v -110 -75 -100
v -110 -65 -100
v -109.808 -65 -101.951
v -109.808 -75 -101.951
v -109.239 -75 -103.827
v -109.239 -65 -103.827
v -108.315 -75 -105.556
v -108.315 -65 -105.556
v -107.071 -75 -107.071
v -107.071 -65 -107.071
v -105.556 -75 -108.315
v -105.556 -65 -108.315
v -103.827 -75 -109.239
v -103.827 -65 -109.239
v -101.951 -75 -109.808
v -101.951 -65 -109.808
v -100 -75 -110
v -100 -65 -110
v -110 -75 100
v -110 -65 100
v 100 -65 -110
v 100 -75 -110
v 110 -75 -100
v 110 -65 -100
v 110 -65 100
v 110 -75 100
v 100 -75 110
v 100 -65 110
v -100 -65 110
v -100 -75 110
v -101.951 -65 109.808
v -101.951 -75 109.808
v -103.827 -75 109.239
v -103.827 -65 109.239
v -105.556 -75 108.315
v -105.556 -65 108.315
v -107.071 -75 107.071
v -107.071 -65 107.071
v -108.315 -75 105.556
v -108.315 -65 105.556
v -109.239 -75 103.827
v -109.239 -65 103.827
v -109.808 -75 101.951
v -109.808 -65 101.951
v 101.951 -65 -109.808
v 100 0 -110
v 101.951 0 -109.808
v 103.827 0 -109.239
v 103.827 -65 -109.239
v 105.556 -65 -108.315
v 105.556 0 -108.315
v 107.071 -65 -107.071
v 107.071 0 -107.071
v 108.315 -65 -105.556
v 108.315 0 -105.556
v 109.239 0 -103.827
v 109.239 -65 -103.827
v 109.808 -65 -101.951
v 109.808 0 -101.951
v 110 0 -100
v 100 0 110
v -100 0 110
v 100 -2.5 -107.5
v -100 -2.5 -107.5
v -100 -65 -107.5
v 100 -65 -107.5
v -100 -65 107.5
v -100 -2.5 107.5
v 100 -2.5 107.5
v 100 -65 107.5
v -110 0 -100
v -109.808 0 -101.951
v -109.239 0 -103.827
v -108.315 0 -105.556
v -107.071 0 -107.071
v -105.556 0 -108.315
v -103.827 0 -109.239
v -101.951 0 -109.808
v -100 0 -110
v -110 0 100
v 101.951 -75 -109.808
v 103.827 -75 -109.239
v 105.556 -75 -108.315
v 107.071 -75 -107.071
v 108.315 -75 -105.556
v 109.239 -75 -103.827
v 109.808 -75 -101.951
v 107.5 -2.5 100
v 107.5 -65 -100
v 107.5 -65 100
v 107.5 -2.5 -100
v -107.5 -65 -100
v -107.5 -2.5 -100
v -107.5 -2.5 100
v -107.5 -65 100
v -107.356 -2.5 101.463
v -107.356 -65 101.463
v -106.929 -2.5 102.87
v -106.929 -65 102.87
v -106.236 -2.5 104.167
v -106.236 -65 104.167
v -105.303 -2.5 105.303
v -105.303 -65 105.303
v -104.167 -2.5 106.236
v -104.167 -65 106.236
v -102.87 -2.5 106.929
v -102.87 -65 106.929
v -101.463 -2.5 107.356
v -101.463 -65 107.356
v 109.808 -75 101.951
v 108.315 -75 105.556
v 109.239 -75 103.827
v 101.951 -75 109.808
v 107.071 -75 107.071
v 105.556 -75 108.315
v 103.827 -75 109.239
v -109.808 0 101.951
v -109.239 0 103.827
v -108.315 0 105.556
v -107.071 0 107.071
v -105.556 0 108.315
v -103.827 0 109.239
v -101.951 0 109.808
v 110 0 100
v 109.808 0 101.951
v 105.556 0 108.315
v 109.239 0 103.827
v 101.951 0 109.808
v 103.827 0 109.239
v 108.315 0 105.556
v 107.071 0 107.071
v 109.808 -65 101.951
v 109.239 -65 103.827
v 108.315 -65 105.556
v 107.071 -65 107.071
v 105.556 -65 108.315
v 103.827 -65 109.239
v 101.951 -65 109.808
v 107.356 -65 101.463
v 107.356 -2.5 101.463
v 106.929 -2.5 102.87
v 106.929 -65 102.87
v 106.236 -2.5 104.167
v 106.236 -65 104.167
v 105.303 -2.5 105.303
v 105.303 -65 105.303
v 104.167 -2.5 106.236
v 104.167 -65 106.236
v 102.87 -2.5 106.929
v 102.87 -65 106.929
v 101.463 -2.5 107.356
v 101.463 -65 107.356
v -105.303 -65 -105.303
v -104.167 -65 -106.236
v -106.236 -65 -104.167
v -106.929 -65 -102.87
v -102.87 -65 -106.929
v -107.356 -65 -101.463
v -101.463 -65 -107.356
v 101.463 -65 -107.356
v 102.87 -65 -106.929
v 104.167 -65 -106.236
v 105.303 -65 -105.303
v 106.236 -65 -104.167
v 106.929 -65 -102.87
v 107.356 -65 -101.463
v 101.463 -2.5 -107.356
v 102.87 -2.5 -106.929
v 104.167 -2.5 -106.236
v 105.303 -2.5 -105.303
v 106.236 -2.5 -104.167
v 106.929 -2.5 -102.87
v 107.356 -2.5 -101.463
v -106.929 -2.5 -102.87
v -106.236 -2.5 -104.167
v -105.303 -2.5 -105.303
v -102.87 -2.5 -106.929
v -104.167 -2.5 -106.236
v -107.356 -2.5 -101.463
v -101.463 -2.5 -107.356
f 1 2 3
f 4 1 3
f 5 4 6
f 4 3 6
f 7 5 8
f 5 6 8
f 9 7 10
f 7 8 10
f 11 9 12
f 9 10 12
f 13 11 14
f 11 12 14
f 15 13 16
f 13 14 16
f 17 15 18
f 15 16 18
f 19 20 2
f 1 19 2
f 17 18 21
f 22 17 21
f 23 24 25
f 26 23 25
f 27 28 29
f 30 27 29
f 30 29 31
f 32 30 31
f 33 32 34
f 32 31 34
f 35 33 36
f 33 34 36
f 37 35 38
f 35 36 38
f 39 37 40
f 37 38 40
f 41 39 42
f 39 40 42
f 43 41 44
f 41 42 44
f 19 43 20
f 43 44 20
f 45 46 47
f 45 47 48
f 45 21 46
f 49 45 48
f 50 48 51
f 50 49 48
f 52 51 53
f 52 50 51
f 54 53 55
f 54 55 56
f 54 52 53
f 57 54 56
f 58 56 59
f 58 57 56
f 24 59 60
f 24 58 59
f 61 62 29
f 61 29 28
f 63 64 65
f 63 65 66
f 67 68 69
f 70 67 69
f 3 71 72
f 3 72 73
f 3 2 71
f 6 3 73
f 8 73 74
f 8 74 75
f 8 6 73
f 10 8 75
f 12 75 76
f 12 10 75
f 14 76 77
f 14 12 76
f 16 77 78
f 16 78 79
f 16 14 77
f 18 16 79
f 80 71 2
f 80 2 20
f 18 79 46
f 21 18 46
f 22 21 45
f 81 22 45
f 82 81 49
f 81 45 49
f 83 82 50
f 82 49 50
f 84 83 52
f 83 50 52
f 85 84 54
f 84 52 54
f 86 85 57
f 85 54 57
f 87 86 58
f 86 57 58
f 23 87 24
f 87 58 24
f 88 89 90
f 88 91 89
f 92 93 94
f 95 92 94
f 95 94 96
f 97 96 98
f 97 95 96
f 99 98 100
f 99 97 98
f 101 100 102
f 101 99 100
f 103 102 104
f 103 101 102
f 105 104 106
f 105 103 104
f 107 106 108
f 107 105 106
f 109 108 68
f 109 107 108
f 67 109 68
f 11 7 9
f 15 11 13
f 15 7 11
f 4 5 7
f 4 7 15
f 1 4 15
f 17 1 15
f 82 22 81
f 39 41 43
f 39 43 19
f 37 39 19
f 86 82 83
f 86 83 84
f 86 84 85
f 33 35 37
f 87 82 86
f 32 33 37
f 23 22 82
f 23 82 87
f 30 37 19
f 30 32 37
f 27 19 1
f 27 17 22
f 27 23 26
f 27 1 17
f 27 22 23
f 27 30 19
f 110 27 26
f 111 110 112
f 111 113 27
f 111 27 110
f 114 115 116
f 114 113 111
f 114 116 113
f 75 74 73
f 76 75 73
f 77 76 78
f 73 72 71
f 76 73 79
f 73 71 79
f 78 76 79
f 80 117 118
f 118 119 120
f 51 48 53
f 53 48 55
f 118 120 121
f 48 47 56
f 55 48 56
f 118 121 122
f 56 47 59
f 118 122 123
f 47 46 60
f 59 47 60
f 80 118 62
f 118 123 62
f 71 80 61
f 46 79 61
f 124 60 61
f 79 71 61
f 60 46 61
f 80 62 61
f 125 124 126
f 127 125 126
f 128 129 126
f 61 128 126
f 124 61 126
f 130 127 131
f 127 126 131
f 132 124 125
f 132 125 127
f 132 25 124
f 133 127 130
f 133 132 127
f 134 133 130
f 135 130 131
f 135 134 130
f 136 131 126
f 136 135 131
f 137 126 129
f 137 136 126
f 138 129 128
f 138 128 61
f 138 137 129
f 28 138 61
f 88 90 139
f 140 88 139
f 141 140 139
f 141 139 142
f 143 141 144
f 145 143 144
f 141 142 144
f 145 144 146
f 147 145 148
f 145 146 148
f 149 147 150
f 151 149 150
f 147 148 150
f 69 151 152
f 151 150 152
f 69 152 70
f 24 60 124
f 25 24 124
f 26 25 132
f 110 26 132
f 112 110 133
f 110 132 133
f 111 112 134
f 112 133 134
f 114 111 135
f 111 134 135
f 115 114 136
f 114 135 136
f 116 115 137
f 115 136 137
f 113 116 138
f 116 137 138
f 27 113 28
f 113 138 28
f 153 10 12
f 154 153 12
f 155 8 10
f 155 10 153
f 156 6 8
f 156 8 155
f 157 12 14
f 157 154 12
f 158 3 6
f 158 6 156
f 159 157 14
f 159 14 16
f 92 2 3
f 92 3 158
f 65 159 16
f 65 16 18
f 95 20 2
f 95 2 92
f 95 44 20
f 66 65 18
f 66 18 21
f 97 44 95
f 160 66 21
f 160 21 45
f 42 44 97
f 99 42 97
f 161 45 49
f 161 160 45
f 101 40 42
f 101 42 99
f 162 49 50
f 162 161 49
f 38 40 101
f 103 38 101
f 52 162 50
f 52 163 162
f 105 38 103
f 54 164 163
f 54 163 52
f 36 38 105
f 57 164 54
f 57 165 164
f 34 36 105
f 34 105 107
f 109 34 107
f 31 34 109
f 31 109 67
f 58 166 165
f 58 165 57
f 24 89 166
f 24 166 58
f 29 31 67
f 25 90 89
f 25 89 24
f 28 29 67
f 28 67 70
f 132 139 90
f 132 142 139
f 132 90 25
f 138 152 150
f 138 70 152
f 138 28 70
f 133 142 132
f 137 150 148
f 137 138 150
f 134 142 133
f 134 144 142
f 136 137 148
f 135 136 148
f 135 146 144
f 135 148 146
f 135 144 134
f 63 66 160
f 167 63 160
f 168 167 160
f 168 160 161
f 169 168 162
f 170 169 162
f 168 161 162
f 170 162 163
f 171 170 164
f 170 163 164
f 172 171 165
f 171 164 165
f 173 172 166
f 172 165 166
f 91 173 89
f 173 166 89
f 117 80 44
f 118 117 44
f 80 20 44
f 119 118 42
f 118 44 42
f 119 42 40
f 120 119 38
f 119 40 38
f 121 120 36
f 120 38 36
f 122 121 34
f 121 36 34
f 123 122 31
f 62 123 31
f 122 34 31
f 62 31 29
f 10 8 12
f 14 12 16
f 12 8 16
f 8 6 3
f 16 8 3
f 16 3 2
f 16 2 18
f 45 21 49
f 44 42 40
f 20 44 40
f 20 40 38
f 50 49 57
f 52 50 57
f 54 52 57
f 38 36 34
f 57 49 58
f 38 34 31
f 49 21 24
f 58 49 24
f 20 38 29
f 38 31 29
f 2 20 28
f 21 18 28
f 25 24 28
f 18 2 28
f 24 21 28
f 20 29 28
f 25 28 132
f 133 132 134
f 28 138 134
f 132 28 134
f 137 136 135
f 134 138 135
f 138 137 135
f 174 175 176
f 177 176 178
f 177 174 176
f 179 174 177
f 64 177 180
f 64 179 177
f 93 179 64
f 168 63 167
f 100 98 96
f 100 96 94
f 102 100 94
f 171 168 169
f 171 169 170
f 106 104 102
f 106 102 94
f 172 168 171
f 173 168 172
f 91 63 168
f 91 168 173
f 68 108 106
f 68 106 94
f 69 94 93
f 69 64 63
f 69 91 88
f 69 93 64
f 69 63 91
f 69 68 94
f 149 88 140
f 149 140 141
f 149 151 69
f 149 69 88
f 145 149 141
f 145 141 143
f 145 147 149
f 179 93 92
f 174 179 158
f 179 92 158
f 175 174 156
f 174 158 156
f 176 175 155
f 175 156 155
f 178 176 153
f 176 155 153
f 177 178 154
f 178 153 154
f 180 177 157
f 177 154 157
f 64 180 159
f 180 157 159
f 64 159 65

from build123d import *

# Parameters (mm, degrees)
F0_W     = 220
F0_H     = 220
F1_DEPTH = 65
F2_R     = 10
F3_T     = -2.5
F5_DEPTH = 10


with BuildPart() as f1:
    # F0 (on Front) → F1 (new body)
    with BuildSketch(Plane.XZ):
        Rectangle(F0_W, F0_H)
    extrude(amount=F1_DEPTH)

    # F2
    f2_edges = [f1.edges().sort_by_distance(p)[0] for p in [
        (110, -32.5, 110),
        (-110, -32.5, 110),
        (110, -32.5, -110),
        (-110, -32.5, -110),
    ]]
    fillet(f2_edges, radius=F2_R)

    # F3
    f3_openings = [f1.faces().sort_by_distance(p)[0] for p in [
        (0, -65, 0),
    ]]
    offset(amount=F3_T, openings=f3_openings)


with BuildPart() as f5:
    # F4 (on face) → F5 (new body)
    with BuildSketch(Plane.XZ.offset(65)):
        with BuildLine():
            ThreePointArc((110, 100), (107.071068, 107.071068), (100, 110))
            Line((100, 110), (-100, 110))
            ThreePointArc((-100, 110), (-107.071068, 107.071068), (-110, 100))
            Line((-110, 100), (-110, -100))
            ThreePointArc((-110, -100), (-107.071068, -107.071068), (-100, -110))
            Line((-100, -110), (100, -110))
            ThreePointArc((100, -110), (107.071068, -107.071068), (110, -100))
            Line((110, -100), (110, 100))
        make_face()
    extrude(amount=F5_DEPTH)


solid = Compound([f1.part, f5.part])
